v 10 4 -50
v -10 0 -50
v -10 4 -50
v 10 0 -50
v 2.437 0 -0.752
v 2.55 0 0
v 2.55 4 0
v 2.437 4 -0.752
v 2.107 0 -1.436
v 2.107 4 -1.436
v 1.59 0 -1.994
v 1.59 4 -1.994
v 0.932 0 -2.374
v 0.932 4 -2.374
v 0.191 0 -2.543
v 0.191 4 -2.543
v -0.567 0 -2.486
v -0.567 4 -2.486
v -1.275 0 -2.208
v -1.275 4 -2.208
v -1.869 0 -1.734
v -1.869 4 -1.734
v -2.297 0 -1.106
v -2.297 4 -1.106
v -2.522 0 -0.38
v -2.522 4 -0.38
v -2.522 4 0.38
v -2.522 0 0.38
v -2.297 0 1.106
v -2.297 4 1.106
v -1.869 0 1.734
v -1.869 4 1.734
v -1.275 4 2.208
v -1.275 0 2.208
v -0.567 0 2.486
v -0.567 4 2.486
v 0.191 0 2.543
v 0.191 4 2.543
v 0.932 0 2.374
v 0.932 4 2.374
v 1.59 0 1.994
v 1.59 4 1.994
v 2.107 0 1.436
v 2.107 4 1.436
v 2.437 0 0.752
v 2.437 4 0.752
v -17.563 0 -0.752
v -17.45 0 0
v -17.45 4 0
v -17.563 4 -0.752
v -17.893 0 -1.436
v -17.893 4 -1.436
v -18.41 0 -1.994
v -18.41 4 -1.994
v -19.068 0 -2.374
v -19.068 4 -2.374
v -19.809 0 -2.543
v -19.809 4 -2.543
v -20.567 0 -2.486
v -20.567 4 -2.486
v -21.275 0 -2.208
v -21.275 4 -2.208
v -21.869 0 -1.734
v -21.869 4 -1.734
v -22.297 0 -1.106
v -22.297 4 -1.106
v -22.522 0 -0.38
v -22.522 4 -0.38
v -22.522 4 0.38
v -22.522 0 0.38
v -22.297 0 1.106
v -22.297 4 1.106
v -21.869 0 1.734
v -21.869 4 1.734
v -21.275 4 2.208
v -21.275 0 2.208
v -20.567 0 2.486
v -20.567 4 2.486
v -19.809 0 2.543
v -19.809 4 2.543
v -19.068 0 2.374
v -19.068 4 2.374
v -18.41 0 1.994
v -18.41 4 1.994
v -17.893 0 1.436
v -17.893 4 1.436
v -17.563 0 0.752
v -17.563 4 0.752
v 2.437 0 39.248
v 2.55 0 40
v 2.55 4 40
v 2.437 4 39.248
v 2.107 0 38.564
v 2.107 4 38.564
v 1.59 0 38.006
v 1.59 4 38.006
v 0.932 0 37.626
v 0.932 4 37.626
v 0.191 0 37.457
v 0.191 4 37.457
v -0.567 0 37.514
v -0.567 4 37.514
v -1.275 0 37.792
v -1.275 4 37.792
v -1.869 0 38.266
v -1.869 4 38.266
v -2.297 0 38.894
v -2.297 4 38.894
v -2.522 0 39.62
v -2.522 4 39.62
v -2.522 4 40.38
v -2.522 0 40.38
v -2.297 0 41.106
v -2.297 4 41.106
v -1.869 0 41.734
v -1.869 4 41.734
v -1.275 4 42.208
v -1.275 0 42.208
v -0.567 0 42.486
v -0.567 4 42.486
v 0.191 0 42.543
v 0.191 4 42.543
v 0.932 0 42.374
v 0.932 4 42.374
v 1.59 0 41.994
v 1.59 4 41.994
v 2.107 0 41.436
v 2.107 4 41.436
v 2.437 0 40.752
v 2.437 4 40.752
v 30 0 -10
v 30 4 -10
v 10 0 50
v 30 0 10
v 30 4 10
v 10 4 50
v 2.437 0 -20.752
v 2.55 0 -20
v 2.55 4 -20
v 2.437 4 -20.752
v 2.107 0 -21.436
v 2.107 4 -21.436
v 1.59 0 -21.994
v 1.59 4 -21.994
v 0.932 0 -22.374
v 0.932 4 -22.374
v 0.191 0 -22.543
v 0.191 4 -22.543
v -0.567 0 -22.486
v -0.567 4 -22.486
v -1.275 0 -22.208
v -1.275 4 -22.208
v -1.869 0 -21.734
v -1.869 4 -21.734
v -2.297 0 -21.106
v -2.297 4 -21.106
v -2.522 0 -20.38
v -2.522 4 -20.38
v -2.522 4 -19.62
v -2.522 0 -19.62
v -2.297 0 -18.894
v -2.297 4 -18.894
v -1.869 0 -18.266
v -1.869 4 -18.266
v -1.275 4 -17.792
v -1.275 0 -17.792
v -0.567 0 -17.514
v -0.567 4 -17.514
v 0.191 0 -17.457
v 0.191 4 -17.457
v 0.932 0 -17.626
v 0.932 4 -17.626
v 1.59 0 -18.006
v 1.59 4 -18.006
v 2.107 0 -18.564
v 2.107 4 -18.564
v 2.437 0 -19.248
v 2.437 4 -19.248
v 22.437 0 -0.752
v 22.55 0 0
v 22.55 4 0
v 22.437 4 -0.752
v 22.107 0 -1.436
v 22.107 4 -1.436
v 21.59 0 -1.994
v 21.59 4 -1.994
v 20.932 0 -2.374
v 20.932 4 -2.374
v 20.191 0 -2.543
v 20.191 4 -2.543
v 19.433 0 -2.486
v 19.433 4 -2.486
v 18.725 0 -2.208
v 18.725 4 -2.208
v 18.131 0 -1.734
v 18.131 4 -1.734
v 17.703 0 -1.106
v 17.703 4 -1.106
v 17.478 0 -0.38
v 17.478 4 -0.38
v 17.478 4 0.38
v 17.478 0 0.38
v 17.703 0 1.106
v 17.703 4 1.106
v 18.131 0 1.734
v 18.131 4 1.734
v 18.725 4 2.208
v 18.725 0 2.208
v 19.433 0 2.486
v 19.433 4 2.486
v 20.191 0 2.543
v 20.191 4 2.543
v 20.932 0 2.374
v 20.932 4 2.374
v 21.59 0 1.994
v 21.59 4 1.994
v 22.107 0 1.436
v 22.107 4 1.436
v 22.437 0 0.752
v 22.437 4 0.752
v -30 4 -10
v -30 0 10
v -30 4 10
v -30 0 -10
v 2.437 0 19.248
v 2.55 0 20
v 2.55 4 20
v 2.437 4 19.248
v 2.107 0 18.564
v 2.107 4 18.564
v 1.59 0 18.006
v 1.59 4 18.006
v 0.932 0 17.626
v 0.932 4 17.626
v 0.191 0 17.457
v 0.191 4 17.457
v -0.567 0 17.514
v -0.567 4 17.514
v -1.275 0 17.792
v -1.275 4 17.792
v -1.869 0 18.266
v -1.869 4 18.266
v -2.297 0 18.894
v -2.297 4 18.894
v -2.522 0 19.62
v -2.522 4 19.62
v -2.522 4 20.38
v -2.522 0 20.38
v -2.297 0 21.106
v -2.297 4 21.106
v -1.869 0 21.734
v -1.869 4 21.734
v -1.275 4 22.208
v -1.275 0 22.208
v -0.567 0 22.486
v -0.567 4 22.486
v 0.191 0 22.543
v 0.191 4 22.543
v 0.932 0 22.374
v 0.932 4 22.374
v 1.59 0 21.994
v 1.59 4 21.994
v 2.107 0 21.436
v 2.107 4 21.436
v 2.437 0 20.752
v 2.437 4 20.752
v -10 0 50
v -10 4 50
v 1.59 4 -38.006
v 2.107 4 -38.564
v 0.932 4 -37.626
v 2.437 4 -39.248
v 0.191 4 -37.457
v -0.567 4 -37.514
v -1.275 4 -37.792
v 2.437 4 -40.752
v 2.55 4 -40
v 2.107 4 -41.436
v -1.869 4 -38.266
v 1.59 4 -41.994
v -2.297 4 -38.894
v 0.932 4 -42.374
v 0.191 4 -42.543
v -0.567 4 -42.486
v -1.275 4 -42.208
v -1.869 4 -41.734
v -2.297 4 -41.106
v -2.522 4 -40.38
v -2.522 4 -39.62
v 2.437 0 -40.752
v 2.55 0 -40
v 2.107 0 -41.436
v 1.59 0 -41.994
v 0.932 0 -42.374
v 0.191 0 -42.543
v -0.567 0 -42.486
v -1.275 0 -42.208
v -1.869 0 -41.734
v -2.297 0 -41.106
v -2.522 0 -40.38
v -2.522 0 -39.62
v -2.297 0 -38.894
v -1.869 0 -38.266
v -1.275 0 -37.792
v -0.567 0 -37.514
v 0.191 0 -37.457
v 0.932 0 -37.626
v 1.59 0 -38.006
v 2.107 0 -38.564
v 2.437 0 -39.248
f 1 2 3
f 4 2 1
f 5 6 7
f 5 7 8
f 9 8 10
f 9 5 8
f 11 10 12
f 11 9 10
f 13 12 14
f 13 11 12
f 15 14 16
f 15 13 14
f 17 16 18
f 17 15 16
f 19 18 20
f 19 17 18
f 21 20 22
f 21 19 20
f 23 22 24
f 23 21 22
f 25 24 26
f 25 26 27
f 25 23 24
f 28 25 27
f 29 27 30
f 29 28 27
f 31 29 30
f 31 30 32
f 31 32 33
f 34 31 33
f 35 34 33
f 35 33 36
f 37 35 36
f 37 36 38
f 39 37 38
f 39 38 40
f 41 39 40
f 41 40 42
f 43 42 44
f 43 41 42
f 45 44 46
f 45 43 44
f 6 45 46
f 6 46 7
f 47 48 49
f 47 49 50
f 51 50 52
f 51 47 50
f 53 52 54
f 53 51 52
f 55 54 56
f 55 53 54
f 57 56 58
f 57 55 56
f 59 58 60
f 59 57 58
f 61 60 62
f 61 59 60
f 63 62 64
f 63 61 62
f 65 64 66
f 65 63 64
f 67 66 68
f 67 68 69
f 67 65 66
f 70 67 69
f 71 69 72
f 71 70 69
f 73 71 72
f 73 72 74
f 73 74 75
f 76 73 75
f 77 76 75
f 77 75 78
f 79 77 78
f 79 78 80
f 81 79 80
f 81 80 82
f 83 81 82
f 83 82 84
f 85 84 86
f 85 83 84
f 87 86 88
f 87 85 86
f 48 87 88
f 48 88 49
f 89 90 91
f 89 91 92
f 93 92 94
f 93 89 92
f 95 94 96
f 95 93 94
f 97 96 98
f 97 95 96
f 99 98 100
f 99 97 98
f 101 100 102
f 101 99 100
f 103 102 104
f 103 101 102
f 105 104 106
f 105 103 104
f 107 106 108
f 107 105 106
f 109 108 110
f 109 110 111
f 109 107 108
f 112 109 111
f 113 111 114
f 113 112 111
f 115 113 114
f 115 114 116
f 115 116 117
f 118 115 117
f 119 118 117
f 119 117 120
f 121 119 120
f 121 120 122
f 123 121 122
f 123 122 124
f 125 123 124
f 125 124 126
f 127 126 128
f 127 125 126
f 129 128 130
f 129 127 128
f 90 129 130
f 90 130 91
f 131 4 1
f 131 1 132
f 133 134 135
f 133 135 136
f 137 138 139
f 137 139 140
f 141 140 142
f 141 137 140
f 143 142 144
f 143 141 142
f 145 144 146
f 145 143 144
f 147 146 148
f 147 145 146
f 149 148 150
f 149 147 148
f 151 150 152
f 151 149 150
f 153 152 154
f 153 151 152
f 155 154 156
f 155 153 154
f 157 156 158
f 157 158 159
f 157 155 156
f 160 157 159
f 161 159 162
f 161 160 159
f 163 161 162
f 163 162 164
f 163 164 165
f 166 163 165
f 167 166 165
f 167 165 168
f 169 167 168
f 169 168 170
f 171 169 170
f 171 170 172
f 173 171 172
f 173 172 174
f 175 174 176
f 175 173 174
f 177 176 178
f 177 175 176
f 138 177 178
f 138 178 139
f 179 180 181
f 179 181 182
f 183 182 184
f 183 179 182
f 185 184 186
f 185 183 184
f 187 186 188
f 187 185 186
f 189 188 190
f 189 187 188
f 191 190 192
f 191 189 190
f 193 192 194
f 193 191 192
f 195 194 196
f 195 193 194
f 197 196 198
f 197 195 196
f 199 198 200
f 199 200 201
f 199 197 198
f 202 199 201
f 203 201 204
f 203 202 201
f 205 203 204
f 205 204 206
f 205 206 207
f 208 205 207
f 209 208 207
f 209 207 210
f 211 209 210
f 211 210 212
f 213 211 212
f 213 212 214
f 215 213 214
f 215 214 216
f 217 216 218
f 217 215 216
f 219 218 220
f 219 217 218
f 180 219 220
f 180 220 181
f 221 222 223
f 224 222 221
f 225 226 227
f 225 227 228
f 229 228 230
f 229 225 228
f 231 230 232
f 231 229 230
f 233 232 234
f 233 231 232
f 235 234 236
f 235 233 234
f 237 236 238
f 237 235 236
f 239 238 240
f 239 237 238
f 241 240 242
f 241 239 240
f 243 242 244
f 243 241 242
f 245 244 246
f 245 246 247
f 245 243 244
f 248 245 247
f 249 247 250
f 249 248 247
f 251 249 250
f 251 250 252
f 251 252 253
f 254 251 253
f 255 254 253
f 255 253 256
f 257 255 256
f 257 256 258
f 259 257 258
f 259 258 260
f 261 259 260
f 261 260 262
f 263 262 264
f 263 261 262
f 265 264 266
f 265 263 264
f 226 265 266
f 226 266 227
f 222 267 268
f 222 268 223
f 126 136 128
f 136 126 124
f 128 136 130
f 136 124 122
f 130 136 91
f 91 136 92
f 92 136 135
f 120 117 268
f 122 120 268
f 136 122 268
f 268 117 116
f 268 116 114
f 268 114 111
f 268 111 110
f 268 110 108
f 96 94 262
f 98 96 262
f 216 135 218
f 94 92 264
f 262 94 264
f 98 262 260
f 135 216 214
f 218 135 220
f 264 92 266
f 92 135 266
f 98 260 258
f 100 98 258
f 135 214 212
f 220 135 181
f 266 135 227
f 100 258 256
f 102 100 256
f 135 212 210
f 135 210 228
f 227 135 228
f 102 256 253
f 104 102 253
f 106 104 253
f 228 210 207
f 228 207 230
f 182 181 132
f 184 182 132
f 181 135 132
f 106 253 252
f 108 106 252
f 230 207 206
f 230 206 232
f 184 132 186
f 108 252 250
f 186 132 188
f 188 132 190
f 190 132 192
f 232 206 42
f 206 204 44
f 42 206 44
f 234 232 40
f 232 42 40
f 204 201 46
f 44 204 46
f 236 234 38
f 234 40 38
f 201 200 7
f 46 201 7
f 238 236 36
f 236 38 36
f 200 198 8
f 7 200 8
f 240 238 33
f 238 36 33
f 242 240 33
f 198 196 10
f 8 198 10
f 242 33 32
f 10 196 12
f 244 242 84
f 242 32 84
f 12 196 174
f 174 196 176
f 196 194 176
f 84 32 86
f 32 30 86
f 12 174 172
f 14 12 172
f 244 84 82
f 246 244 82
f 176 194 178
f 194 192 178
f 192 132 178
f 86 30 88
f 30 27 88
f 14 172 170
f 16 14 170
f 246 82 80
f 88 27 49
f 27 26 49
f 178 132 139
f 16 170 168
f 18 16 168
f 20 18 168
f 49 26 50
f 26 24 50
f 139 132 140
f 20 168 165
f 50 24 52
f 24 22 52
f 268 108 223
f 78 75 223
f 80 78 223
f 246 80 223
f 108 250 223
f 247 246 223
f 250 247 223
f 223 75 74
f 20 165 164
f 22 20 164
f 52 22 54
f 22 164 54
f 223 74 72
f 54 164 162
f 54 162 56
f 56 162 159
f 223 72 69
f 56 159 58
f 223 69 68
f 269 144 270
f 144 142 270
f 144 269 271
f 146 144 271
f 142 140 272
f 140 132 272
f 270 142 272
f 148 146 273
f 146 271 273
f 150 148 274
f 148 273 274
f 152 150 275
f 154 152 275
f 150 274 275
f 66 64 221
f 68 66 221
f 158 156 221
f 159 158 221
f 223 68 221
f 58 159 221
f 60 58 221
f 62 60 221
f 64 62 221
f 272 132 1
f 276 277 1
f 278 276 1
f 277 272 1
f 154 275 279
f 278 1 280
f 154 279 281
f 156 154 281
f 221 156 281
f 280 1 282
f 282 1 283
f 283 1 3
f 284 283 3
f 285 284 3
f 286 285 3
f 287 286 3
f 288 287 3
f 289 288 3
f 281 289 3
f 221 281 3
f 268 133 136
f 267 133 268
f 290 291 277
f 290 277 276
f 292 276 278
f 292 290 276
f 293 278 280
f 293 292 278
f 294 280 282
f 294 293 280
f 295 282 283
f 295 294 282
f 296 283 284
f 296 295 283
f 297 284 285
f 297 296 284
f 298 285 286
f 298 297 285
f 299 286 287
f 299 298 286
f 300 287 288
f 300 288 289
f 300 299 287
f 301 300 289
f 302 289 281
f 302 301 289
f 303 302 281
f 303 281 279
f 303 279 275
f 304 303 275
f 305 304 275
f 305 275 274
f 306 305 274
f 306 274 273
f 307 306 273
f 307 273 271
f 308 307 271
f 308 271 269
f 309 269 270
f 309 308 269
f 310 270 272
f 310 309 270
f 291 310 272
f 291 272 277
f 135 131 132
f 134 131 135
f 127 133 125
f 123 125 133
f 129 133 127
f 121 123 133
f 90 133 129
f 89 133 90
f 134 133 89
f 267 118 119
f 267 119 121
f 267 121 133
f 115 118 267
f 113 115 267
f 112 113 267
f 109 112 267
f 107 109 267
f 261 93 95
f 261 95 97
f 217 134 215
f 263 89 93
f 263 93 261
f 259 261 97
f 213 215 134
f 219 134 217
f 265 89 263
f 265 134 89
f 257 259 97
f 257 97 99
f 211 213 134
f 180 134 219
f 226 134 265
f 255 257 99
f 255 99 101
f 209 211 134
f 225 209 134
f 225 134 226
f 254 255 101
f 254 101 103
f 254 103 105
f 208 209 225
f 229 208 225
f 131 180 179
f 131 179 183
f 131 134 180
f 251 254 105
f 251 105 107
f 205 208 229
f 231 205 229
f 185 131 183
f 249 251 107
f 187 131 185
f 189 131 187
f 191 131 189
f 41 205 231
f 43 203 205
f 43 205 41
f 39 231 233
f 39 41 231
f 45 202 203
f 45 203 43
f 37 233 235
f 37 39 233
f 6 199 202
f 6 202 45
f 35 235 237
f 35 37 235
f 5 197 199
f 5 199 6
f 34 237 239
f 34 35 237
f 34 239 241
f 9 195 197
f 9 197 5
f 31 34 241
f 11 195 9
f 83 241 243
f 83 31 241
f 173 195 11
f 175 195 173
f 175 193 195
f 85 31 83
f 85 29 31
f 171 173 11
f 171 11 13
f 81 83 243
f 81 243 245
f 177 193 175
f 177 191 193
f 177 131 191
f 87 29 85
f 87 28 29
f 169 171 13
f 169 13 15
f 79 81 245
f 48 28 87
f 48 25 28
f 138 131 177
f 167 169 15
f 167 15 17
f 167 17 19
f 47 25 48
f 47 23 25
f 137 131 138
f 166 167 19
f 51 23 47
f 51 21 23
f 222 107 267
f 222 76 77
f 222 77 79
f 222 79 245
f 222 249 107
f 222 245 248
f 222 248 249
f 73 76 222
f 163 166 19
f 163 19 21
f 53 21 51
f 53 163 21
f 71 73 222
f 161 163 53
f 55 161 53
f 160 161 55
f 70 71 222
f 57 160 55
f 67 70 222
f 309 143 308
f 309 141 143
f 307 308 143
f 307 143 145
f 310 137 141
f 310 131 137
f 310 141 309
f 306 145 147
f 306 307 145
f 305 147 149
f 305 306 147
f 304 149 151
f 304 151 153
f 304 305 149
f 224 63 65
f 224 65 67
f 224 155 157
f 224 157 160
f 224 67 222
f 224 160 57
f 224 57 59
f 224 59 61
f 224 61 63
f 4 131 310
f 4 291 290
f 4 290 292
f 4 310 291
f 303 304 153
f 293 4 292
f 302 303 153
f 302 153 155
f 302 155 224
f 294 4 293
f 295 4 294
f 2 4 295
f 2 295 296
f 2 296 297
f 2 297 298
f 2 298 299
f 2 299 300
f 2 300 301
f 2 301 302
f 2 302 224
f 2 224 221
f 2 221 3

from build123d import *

# Parameters (mm, degrees)
SKETCH1_R           = 2.55
BOSS_EXTRUDE1_DEPTH = 4


with BuildPart() as part:
    # Sketch1 → Boss-Extrude1 (new body)
    with BuildSketch(Plane(origin=(0, 0, 0), x_dir=(1, 0, 0), z_dir=(0, 1, 0))):
        Polygon((30, -10), (10, -50), (-10, -50), (-30, -10), (-30, 10), (-10, 50), (10, 50), (30, 10), align=None)
        with Locations((0, 20)):
            Circle(SKETCH1_R, mode=Mode.SUBTRACT)
        with Locations((0, 40)):
            Circle(SKETCH1_R, mode=Mode.SUBTRACT)
        Circle(SKETCH1_R, mode=Mode.SUBTRACT)
        with Locations((0, -20)):
            Circle(SKETCH1_R, mode=Mode.SUBTRACT)
        with Locations((0, -40)):
            Circle(SKETCH1_R, mode=Mode.SUBTRACT)
        with Locations((-20, 0)):
            Circle(SKETCH1_R, mode=Mode.SUBTRACT)
        with Locations((20, 0)):
            Circle(SKETCH1_R, mode=Mode.SUBTRACT)
    extrude(amount=BOSS_EXTRUDE1_DEPTH)


solid = part.part
